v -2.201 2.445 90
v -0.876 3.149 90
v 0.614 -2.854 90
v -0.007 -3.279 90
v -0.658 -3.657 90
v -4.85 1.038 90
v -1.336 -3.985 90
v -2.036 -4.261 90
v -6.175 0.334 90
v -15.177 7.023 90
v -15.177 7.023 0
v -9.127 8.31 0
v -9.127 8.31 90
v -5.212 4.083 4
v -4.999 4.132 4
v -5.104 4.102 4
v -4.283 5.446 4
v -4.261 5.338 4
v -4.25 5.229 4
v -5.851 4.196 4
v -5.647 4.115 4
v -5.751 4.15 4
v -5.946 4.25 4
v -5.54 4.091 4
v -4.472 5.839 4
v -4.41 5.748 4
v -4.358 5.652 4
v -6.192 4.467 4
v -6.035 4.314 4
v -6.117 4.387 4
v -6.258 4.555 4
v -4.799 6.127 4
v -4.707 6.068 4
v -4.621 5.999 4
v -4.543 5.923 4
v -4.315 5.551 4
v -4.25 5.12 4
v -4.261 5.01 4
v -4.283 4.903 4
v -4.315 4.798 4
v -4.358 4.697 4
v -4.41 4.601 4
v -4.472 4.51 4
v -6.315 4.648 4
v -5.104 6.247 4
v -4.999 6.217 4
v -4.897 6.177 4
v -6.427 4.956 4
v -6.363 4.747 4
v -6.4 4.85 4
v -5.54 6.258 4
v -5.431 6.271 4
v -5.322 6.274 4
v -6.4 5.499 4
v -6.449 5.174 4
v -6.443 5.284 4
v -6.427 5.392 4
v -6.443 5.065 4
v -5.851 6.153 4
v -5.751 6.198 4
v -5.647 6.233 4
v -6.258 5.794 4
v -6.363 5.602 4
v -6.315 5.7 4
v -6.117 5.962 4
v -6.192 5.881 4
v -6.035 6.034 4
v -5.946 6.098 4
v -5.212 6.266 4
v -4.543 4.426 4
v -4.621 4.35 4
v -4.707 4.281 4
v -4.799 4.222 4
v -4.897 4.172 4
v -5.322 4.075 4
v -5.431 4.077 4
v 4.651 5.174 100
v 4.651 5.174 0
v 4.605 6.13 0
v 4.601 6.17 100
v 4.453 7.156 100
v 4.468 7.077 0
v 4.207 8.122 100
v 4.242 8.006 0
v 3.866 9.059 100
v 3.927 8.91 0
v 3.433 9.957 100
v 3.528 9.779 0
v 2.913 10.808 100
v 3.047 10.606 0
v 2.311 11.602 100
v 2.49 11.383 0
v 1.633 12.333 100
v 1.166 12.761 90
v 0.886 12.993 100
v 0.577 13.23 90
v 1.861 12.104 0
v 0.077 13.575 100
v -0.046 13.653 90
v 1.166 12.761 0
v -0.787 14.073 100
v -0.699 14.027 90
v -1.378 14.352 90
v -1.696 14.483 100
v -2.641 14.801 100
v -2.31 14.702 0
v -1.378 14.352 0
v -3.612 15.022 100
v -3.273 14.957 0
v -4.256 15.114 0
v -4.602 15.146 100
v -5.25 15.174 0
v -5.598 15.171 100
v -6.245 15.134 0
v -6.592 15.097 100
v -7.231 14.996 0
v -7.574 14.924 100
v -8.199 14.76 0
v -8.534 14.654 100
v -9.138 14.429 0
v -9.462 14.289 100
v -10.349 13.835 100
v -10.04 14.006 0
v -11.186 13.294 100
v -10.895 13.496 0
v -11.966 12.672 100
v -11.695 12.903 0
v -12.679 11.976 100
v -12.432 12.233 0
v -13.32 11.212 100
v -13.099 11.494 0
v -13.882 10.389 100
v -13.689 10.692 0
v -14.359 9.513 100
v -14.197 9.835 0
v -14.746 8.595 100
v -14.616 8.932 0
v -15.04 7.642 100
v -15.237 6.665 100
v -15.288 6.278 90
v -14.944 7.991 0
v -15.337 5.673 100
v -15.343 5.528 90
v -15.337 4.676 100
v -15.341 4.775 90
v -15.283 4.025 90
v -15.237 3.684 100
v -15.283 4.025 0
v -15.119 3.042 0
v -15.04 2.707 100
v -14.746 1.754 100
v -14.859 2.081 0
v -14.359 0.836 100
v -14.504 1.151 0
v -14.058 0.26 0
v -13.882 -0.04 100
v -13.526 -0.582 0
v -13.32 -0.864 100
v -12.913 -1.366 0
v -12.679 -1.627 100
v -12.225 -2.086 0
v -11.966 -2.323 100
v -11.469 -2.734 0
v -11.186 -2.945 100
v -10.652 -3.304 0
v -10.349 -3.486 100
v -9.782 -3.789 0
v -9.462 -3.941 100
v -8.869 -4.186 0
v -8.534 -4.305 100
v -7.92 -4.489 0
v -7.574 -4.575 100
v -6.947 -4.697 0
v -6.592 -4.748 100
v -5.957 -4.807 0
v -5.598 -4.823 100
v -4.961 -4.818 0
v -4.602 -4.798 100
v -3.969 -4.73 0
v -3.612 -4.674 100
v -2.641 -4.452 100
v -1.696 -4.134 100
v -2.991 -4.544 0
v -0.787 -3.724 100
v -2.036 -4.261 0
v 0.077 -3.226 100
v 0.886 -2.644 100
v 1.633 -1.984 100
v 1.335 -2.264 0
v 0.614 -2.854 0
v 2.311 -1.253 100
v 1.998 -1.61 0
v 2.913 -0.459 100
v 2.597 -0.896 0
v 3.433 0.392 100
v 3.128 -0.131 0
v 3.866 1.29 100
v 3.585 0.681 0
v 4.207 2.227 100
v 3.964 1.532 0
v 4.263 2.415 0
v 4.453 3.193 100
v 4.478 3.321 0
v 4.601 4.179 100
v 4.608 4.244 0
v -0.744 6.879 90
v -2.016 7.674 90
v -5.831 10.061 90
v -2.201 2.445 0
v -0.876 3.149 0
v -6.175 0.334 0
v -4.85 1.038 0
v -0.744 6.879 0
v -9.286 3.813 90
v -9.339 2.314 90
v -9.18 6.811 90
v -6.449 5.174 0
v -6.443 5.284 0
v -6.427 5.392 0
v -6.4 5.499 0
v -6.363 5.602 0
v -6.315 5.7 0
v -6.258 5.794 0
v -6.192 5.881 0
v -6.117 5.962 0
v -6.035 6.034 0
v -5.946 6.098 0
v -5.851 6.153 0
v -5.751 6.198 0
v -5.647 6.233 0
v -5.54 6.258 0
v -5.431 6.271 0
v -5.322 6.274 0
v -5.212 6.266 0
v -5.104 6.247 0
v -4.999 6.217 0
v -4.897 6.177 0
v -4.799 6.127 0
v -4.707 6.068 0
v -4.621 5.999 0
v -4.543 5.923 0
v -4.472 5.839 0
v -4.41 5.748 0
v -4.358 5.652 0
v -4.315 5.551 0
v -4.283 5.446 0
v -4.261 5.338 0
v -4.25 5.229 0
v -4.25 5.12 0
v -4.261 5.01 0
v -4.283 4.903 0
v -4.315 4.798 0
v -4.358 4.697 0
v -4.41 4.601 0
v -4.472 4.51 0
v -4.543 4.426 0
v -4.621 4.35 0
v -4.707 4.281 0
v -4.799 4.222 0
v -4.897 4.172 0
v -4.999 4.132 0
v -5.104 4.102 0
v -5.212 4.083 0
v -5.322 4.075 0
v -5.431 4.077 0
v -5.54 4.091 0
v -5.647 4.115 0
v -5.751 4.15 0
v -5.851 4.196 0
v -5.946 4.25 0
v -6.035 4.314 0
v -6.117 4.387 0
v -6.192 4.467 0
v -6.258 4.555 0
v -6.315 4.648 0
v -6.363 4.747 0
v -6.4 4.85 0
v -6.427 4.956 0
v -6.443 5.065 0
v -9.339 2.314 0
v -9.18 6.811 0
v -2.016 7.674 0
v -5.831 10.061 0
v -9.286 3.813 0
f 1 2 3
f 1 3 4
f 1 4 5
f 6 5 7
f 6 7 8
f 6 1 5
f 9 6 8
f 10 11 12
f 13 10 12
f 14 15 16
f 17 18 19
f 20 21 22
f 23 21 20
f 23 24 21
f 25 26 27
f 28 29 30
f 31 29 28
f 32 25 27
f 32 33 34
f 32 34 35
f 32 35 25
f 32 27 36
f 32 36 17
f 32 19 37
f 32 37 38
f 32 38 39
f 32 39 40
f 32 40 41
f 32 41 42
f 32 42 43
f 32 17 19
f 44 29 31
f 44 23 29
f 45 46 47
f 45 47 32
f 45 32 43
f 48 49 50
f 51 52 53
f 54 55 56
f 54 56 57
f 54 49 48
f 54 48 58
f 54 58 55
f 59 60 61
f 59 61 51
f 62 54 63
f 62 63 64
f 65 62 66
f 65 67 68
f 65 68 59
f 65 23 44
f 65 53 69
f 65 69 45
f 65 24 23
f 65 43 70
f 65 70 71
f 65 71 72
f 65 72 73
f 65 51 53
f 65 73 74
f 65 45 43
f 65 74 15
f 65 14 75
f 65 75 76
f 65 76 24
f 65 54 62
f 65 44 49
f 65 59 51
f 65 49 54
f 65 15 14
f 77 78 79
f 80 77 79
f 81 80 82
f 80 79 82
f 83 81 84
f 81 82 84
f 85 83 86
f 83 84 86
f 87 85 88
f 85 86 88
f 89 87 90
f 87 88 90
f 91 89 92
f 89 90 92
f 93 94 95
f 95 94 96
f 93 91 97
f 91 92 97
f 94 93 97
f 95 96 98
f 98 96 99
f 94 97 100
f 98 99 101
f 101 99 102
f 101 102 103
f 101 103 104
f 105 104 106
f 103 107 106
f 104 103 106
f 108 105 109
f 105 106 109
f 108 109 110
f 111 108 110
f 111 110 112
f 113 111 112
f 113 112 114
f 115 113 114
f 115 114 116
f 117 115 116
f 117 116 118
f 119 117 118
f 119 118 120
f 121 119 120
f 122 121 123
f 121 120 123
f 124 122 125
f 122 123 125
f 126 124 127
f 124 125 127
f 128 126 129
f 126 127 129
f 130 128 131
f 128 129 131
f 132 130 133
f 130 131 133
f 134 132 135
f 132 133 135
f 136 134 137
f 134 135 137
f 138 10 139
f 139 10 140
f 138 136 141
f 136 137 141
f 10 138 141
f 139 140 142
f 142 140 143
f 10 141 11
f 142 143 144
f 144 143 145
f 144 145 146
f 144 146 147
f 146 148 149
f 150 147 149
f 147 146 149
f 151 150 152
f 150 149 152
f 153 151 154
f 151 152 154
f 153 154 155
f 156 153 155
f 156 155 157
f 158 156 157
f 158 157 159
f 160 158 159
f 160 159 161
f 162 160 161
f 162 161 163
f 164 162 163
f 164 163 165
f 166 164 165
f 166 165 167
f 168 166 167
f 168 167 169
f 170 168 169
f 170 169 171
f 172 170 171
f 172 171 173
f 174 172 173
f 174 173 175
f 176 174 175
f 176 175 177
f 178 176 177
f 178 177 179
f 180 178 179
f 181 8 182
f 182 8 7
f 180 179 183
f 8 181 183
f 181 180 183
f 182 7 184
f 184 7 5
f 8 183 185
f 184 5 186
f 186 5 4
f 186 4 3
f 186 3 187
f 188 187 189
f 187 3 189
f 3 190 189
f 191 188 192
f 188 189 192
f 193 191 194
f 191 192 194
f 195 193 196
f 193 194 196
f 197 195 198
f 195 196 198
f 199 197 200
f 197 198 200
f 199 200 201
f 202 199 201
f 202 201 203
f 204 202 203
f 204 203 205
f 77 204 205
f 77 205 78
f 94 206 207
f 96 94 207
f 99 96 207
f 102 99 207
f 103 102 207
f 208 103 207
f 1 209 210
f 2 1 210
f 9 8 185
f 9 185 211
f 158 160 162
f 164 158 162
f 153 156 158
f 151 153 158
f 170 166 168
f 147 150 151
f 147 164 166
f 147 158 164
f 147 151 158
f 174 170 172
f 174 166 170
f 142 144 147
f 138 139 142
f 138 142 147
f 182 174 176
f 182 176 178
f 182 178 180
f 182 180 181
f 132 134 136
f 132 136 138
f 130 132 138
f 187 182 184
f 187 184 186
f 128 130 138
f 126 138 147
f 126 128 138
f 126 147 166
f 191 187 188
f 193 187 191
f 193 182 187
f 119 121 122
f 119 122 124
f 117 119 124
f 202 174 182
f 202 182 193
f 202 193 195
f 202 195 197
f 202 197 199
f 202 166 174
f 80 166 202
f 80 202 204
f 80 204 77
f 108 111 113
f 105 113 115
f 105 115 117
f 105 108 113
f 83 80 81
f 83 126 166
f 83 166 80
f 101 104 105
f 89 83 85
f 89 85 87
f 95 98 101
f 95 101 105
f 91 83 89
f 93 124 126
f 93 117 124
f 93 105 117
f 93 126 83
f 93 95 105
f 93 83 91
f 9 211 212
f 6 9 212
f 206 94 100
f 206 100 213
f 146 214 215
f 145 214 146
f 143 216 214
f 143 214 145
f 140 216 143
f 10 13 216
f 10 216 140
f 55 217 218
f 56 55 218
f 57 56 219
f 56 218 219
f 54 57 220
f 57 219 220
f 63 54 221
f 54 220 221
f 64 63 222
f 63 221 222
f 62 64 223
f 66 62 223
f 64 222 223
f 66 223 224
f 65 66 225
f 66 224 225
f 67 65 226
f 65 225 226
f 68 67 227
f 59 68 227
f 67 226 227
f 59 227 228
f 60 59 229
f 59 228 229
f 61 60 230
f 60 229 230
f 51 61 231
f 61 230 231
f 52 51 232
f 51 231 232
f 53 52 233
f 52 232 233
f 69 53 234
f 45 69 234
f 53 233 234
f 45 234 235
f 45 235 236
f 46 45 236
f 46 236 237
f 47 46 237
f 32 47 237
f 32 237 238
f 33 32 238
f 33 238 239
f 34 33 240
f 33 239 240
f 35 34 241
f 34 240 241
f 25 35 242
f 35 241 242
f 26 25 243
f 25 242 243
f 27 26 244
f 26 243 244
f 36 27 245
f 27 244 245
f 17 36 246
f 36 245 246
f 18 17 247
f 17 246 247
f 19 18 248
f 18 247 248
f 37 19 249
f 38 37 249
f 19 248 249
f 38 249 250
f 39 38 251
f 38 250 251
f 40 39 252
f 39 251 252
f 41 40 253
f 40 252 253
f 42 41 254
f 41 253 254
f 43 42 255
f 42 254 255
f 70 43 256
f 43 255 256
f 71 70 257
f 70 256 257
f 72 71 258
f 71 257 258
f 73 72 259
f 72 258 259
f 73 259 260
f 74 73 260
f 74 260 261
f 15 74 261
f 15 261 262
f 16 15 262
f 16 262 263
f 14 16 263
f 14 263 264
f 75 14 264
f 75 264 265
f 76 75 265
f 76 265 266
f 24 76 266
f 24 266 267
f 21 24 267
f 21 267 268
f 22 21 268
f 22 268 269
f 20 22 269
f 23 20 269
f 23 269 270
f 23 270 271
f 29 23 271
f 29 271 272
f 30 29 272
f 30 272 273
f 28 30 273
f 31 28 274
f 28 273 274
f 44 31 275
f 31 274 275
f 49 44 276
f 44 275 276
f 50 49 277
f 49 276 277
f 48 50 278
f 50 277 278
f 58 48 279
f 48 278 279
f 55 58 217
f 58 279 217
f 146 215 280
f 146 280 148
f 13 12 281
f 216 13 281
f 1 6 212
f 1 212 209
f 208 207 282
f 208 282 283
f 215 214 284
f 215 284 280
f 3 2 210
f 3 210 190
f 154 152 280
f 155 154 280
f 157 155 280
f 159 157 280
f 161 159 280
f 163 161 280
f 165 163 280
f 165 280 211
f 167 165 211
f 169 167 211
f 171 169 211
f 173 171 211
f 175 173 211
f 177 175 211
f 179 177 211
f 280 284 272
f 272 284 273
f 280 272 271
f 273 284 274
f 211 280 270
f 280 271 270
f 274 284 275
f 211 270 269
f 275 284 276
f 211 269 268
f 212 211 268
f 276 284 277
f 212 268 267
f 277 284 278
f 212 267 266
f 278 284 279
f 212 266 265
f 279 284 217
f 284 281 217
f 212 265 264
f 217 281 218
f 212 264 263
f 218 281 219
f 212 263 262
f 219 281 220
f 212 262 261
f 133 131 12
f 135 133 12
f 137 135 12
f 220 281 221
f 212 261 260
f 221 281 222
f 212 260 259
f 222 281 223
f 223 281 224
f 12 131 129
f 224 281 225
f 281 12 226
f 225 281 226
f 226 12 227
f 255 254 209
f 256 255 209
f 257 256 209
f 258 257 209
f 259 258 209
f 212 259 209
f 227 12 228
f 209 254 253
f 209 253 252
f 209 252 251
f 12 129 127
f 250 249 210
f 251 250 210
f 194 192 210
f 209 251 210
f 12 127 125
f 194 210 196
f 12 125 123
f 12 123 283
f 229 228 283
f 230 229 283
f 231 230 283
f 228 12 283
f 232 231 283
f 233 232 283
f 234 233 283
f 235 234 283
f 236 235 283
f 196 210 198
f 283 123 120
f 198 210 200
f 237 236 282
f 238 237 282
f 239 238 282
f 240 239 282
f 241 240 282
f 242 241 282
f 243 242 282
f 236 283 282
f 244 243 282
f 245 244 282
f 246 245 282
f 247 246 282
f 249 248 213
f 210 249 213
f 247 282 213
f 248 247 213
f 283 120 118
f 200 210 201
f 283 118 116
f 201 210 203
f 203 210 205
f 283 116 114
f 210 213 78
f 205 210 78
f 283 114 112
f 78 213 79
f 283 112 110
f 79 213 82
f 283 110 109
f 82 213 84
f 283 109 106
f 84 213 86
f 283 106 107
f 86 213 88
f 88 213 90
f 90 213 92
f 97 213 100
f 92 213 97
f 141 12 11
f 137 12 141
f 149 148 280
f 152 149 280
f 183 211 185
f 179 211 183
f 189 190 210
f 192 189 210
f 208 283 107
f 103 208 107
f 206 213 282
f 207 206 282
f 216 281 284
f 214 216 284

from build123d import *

# Parameters (mm, degrees)
SKETCH_1_R          = 10
EXTRUDE_1_DEPTH     = 100
SKETCH_5_R          = 1.1
CUT_EXTRUDE_3_DEPTH = 4
CUT_EXTRUDE_2_DEPTH = 90


with BuildPart() as part:
    # ｽｹｯﾁ1 → ﾎﾞｽ - 押し出し1 (new body)
    with BuildSketch(Plane.XY):
        with Locations((-5.348947677, 5.174385531)):
            Circle(SKETCH_1_R)
    extrude(amount=EXTRUDE_1_DEPTH)

    # ｽｹｯﾁ5 → ｶｯﾄ - 押し出し3 (cut)
    with BuildSketch(Plane(origin=(0, 0, 0), x_dir=(-1, 0, 0), z_dir=(0, 0, -1))):
        with Locations((5.348947677, 5.174385531)):
            Circle(SKETCH_5_R)
    extrude(amount=-CUT_EXTRUDE_3_DEPTH, mode=Mode.SUBTRACT)

    # ｽｹｯﾁ3 → ｶｯﾄ - 押し出し2 (cut)
    with BuildSketch(Plane(origin=(0, 0, 0), x_dir=(-1, 0, 0), z_dir=(0, 0, -1))):
        Polygon((9.180368817, 6.810812261), (9.286390444, 3.812686278), (9.339401258, 2.313623286), (15.282642412, 4.024729531), (17.281393068, 4.095410616), (17.175371441, 7.093536599), (15.176620785, 7.022855515), (9.127358004, 8.309875253), align=None)
        Polygon((2.016049987, 7.674280205), (4.559492439, 9.265160619), (5.831213665, 10.060600826), (1.377731611, 14.352045524), (0.317144668, 16.047673826), (-2.226297784, 14.456793412), (-1.165710841, 12.76116511), (0.74432876, 6.878839998), align=None)
        Polygon((4.850424227, 1.038064125), (2.200960148, 2.445309695), (0.876228108, 3.14893248), (-0.613530992, -2.853618463), (-1.551694705, -4.619927849), (1.097769374, -6.027173419), (2.035933088, -4.260864033), (6.175156267, 0.33444134), align=None)
    extrude(amount=-CUT_EXTRUDE_2_DEPTH, mode=Mode.SUBTRACT)


solid = part.part
